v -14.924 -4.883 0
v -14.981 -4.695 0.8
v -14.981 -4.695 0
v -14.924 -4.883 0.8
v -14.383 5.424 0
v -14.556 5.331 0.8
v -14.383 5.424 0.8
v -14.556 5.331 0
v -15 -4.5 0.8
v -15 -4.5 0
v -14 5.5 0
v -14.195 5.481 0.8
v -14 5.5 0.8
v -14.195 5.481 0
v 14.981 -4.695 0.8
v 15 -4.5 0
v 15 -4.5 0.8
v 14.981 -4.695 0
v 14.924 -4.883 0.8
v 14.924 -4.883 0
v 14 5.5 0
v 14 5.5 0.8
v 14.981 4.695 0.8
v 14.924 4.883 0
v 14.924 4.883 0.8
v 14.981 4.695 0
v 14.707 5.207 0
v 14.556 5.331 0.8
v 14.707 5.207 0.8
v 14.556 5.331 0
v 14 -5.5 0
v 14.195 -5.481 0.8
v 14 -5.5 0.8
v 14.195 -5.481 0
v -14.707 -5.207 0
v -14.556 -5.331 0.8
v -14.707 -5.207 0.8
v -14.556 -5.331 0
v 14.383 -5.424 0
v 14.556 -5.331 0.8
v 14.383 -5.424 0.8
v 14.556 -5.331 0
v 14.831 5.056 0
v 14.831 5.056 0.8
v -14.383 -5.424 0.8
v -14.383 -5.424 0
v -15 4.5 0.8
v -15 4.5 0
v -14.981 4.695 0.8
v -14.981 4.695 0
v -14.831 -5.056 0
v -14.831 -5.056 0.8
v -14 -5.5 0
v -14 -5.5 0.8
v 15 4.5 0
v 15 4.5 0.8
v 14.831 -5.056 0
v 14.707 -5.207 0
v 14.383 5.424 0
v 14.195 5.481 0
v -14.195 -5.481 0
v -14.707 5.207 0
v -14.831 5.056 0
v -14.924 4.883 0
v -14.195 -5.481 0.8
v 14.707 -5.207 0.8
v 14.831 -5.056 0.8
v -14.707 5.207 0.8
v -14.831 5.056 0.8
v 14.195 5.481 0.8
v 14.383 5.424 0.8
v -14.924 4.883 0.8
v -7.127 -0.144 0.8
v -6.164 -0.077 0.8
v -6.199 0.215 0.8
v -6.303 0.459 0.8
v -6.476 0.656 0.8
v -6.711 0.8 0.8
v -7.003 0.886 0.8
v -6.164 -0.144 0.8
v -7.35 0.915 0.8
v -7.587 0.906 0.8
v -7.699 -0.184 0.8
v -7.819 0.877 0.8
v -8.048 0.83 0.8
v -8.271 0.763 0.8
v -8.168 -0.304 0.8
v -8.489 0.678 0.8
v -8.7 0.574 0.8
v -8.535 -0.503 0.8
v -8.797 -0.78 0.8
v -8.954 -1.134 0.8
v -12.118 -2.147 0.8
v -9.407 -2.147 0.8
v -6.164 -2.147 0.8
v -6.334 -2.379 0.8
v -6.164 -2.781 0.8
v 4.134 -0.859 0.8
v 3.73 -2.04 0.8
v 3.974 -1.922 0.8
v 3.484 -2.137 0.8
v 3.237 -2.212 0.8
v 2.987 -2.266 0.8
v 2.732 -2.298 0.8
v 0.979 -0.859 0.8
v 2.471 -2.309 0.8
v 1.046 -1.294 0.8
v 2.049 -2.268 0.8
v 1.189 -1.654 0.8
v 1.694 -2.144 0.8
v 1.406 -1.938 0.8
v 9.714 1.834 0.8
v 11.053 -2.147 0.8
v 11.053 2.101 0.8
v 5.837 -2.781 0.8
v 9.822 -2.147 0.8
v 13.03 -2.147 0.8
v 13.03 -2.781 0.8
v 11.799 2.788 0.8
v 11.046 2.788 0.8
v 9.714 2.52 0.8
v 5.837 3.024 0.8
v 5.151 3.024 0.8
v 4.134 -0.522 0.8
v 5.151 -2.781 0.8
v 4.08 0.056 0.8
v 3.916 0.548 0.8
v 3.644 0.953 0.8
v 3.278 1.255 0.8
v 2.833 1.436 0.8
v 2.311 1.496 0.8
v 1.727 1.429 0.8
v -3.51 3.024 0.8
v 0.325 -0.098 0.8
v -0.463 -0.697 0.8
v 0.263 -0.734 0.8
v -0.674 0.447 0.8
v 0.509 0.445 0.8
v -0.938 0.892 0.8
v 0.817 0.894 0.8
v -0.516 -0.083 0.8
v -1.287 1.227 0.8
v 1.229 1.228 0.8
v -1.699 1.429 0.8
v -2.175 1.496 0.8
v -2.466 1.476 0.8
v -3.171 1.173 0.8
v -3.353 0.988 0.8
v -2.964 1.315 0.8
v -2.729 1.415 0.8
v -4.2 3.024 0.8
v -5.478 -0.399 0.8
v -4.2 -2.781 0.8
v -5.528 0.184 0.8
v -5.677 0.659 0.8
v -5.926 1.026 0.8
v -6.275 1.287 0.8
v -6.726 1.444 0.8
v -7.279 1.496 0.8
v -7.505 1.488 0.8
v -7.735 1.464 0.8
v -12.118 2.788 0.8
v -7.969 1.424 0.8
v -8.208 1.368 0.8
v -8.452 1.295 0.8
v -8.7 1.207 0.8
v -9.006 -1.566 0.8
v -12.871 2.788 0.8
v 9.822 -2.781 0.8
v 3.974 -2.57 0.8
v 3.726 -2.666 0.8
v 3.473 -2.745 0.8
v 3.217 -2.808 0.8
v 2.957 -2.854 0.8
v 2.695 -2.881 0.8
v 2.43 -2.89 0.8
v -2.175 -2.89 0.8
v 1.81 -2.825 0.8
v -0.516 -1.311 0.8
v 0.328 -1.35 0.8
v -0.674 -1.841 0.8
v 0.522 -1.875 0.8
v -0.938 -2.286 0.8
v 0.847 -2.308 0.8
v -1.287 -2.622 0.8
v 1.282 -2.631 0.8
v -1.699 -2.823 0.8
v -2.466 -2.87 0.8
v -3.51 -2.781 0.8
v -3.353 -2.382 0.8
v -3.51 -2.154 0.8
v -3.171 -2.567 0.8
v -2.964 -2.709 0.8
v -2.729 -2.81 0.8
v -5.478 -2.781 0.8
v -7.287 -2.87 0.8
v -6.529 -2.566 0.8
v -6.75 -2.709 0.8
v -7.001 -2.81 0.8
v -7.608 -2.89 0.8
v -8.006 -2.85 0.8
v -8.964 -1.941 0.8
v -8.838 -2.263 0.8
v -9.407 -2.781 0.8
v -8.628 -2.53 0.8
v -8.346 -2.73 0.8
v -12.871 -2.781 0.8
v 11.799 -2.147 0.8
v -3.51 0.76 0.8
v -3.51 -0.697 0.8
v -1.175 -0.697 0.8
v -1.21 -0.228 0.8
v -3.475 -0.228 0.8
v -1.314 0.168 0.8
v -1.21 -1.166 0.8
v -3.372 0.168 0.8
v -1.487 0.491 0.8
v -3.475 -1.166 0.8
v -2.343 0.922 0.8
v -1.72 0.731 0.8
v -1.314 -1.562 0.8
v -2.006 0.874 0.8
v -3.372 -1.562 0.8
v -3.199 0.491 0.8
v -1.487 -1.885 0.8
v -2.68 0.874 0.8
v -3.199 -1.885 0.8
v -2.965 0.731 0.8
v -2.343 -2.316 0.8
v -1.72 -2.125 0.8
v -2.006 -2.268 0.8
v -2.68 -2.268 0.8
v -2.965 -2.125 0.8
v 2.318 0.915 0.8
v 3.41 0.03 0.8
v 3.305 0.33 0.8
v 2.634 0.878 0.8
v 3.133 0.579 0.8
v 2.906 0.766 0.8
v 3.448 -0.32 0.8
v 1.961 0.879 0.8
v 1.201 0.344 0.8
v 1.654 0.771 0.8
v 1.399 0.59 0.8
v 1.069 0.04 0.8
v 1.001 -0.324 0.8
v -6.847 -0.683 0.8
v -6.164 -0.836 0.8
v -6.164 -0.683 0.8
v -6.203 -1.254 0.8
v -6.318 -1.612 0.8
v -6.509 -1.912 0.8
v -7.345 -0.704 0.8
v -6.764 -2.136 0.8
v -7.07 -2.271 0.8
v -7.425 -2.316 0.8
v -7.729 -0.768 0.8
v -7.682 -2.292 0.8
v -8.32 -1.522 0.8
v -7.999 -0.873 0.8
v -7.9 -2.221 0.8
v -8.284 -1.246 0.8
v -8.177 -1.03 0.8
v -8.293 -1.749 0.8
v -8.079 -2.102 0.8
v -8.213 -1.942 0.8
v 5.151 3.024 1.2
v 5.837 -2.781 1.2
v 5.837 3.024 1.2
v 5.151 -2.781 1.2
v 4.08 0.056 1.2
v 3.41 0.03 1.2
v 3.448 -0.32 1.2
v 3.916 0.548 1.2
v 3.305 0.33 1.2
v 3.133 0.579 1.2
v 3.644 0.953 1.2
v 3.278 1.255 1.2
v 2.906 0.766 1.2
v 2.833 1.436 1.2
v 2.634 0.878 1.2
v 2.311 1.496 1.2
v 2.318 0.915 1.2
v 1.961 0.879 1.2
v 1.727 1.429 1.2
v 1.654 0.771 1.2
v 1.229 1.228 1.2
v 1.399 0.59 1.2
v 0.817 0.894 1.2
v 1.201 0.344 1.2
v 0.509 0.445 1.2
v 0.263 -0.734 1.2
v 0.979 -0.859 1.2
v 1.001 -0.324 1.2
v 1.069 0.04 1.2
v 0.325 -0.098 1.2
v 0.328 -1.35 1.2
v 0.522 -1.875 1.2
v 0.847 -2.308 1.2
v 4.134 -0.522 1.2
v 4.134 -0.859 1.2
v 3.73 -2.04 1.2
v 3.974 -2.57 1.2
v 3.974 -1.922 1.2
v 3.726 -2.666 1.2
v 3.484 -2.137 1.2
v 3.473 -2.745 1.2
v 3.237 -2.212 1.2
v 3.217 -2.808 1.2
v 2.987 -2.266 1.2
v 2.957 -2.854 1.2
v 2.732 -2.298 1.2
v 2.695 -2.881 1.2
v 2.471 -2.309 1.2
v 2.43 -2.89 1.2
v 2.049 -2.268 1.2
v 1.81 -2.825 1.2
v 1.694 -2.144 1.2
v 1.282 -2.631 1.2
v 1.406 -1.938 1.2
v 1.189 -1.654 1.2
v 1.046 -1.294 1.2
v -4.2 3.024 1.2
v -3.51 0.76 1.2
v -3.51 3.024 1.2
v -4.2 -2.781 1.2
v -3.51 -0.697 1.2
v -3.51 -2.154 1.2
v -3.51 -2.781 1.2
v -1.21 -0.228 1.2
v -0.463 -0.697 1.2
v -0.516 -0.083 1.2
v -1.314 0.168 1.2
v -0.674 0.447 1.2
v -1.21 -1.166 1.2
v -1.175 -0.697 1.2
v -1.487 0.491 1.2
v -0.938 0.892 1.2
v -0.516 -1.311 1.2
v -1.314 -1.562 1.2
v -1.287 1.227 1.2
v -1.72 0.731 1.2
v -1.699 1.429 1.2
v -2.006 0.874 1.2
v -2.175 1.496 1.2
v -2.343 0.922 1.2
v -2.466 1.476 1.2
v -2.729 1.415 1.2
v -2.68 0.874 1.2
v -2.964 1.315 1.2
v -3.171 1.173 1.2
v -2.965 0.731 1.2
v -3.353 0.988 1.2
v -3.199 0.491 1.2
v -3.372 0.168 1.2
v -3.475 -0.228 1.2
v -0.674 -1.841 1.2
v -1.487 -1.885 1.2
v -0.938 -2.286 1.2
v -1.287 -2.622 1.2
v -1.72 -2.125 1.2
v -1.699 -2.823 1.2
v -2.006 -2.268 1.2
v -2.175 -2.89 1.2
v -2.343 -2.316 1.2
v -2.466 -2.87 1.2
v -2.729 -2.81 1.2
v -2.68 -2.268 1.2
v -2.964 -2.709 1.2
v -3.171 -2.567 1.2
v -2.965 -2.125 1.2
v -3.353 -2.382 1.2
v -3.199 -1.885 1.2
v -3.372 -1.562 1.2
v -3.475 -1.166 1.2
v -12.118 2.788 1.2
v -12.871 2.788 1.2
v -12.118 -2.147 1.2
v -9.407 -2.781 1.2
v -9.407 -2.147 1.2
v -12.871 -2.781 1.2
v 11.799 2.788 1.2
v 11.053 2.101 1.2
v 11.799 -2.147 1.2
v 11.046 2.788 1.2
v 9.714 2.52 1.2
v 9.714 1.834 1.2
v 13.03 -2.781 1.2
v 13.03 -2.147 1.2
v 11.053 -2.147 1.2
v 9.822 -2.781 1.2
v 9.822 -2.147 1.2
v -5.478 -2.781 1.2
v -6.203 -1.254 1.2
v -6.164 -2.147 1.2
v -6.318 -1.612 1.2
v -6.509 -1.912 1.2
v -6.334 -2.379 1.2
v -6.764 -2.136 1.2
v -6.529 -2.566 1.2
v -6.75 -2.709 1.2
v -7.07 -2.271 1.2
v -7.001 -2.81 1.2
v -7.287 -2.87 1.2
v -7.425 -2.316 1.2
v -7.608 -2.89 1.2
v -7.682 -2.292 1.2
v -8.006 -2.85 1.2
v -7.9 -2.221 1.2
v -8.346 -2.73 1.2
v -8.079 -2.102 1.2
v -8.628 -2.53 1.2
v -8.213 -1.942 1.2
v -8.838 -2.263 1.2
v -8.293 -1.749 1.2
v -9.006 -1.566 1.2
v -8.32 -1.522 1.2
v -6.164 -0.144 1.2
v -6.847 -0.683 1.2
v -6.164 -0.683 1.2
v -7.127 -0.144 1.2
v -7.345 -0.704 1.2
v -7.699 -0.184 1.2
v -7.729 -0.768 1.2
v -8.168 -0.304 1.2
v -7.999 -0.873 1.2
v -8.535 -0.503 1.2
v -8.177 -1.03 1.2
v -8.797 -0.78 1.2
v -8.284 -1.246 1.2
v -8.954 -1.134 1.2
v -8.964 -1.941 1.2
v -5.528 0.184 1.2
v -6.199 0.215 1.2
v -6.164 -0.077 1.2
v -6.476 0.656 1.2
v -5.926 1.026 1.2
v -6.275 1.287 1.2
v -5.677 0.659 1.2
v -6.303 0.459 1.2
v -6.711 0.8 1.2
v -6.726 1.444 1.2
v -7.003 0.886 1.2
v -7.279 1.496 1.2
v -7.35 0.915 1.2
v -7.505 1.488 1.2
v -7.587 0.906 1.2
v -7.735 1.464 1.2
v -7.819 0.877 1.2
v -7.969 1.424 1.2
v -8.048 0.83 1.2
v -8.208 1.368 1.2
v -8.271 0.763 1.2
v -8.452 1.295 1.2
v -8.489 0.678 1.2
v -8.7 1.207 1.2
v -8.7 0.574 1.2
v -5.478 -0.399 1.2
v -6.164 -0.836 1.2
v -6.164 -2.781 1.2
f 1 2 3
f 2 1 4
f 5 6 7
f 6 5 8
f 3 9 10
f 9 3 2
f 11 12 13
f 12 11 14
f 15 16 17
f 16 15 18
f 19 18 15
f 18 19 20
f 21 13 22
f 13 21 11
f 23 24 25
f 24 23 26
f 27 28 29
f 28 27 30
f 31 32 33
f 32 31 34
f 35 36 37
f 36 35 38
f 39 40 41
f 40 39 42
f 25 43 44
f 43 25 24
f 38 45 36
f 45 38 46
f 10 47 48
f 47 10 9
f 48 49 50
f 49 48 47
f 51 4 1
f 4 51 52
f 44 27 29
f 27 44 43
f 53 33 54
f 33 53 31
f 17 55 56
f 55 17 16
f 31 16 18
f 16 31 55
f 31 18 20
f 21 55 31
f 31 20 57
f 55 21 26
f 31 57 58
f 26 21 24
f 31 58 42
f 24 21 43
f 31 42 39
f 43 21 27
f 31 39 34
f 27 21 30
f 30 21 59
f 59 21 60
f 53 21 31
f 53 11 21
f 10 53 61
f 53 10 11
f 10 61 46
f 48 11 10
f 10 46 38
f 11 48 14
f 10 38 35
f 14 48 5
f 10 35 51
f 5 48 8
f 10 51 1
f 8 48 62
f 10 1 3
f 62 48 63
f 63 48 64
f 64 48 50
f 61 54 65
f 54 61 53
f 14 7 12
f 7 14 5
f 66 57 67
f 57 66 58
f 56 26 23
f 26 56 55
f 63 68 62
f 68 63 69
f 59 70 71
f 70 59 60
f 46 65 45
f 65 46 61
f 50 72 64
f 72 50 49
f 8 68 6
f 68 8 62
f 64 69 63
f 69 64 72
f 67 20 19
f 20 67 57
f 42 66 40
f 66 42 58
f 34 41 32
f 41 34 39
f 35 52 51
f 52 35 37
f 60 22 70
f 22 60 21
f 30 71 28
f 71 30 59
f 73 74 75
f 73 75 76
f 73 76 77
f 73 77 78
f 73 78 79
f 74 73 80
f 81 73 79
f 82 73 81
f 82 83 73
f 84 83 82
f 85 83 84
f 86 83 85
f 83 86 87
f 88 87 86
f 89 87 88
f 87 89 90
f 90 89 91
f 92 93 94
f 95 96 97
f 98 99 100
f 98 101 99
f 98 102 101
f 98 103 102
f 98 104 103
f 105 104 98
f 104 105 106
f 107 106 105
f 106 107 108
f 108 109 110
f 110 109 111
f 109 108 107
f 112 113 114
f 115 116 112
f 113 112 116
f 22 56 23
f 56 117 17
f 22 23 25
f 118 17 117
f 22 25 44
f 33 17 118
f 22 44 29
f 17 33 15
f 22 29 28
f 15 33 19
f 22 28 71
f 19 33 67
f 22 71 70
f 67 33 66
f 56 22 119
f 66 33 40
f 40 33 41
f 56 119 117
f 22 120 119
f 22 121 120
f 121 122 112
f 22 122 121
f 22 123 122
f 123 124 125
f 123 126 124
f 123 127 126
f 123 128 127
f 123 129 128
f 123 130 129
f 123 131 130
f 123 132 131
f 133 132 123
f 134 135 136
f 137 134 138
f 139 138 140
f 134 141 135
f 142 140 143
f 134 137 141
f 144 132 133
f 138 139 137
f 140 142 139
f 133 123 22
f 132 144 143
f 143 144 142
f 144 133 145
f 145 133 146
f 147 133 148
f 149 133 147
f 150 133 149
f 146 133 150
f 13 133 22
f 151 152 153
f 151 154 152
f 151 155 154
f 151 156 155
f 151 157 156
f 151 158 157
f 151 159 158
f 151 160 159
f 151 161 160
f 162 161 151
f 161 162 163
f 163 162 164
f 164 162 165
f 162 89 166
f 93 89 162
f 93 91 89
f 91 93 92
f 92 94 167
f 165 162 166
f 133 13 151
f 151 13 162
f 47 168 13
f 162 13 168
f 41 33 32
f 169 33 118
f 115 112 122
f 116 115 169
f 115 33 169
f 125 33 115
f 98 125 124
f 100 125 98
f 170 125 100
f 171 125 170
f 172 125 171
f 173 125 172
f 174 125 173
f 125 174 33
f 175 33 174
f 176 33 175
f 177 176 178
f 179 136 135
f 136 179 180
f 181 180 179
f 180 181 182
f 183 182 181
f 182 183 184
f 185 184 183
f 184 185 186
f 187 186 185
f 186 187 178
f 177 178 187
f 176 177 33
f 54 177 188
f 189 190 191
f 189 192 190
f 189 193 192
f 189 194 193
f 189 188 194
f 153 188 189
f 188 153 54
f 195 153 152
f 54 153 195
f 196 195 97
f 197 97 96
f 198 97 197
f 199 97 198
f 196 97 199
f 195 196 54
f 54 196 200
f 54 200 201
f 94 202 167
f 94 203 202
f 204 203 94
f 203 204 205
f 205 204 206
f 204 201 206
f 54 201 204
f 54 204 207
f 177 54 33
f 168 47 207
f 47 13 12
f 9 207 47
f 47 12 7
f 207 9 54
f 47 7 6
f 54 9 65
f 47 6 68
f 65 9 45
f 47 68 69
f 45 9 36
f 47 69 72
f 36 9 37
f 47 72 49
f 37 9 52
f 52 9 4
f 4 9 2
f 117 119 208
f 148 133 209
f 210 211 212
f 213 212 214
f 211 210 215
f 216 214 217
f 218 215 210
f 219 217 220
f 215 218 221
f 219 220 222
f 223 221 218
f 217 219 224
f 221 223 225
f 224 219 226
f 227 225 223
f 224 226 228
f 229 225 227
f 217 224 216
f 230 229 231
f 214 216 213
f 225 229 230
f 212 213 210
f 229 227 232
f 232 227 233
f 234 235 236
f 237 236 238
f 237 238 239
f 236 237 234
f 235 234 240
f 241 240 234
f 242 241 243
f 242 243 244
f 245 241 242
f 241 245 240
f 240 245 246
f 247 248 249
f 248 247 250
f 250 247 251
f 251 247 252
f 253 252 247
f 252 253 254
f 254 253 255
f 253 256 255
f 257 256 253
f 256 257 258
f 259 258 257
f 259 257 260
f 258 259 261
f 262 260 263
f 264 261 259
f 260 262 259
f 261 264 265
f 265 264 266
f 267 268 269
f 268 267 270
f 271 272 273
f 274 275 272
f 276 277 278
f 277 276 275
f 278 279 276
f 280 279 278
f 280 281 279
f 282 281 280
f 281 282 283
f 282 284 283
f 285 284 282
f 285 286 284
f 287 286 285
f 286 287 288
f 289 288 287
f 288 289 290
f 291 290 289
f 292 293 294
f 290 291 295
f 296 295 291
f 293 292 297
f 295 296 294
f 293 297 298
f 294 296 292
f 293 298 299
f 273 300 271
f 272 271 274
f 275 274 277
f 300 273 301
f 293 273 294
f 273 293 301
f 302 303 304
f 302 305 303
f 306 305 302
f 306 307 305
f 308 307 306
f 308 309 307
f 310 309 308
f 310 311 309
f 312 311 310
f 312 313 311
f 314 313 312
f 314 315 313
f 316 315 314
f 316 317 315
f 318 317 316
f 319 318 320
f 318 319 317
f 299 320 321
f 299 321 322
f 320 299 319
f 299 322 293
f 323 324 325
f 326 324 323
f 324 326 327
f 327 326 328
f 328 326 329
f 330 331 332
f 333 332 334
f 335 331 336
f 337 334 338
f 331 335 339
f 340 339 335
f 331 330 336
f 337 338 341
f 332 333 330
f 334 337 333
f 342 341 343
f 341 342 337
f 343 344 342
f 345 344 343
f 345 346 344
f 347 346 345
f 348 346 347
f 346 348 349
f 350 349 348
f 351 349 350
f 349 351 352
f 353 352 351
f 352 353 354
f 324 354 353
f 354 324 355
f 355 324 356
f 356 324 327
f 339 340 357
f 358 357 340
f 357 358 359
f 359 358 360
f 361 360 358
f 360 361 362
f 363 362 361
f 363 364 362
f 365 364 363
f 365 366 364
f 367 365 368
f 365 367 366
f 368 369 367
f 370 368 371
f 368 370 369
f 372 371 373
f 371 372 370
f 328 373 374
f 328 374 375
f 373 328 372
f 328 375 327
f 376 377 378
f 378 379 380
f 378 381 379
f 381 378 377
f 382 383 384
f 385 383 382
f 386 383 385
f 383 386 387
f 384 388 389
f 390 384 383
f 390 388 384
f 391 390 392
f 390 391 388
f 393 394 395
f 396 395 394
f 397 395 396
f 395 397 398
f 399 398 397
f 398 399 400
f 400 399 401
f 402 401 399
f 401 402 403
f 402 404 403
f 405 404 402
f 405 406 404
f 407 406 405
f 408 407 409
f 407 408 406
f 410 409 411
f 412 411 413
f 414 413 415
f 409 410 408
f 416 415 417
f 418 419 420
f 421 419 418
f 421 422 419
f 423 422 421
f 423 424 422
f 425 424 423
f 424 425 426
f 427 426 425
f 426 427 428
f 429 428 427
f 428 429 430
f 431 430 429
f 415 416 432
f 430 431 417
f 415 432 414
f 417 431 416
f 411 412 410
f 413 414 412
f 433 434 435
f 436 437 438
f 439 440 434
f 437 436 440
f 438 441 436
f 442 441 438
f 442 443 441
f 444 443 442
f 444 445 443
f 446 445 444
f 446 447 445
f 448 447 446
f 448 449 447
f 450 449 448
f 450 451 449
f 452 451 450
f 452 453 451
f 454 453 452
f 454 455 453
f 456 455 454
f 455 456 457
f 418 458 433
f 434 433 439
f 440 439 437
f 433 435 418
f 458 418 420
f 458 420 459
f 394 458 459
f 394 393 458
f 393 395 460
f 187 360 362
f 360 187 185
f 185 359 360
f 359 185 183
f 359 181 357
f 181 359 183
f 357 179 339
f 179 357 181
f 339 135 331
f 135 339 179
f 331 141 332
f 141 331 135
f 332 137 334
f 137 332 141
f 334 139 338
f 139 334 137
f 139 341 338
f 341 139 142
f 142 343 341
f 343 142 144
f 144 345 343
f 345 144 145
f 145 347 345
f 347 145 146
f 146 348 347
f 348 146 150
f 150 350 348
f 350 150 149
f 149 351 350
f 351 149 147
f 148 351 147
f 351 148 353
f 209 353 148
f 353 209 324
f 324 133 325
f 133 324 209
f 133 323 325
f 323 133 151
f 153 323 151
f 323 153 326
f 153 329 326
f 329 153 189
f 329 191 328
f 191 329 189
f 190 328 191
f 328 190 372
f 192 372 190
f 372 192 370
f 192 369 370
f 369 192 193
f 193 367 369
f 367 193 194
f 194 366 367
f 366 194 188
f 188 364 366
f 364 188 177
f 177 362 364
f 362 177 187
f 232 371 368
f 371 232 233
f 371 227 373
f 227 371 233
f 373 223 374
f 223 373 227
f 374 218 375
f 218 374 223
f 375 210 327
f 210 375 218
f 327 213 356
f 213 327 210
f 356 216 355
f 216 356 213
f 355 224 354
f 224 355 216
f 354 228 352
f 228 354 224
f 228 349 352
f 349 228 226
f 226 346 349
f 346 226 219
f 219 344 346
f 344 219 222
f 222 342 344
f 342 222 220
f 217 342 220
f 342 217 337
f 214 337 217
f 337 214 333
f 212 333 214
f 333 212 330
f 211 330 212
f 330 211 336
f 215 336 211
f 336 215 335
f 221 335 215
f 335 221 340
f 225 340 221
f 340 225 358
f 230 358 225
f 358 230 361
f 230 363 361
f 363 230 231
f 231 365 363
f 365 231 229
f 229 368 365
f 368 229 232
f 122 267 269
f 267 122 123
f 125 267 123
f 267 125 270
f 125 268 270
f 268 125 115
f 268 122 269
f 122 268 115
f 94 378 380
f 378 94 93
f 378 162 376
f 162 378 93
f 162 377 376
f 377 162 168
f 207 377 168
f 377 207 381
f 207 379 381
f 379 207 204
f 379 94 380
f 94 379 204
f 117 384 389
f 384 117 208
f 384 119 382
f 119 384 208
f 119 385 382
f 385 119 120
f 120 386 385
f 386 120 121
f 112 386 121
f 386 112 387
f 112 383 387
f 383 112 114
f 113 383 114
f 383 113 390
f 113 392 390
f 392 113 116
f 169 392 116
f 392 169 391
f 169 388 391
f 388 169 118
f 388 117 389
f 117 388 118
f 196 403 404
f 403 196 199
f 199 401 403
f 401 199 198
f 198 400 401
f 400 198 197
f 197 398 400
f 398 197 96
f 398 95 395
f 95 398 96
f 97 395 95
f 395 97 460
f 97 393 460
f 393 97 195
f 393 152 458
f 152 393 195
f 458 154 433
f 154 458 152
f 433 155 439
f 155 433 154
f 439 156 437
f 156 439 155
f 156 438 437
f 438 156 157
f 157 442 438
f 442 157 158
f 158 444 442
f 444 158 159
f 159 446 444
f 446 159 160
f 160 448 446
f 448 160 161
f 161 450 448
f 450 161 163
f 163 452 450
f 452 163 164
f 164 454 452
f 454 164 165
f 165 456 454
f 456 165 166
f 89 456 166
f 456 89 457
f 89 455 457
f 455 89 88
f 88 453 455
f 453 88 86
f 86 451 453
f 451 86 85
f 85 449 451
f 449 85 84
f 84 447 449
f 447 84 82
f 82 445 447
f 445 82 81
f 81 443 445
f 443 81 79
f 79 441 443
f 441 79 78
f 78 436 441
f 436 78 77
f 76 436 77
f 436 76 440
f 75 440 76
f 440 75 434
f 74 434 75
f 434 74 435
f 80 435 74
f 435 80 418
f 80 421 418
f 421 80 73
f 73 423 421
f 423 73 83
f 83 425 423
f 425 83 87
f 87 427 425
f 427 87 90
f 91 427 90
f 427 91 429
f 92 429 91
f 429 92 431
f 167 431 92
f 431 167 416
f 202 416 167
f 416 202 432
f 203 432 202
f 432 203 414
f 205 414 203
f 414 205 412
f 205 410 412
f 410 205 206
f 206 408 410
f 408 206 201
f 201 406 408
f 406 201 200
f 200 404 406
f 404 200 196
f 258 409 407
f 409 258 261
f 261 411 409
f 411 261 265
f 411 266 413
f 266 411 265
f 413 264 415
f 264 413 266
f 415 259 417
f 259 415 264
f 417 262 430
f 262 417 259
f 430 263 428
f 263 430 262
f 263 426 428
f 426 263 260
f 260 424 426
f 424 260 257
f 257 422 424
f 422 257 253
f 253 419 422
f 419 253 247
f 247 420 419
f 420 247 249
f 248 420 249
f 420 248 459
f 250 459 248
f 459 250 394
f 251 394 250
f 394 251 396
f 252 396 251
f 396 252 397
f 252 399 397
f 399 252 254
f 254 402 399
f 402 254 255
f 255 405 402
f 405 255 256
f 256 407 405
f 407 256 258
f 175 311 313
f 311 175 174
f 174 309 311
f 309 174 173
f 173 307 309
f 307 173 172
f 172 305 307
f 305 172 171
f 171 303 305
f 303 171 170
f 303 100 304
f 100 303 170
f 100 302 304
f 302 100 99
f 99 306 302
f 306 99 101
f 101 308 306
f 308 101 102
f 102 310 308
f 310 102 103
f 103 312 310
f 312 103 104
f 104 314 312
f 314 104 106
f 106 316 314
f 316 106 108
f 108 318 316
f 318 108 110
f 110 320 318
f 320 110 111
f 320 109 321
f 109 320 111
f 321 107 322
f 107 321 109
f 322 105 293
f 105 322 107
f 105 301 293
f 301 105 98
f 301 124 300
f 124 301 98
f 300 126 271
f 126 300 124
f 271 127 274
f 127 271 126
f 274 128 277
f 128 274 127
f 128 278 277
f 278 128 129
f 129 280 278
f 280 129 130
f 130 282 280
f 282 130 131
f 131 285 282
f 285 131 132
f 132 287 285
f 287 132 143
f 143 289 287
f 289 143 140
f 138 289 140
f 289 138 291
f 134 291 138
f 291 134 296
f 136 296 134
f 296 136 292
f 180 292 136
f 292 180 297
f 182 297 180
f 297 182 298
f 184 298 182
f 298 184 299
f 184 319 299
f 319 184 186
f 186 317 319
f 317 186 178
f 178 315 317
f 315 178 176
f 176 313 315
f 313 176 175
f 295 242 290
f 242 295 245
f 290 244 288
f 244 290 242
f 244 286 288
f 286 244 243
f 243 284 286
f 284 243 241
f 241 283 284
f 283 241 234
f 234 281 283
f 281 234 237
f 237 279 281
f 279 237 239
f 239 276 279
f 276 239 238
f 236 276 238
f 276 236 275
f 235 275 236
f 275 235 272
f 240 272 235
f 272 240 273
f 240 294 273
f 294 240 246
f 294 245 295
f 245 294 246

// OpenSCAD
// =======================================================
// Label Creator for SKÅDIS Organizer System
// =======================================================

// ===============================
// Visible user parameters (ordered)
// ===============================

// Label size options
// Options: "S", "M", "L", "XL", "XXL"
Size = "S";

// Text size options
// Options: "S", "M", "L"
Text_Size = "L";

// Number of labels to generate (1–10)
Count = 1;  // increase to add more labels vertically

Label_1 = "Label 1";
Label_2 = "Label 2";
Label_3 = "Label 3";
Label_4 = "Label 4";
Label_5 = "Label 5";
Label_6 = "Label 6";
Label_7 = "Label 7";
Label_8 = "Label 8";
Label_9 = "Label 9";
Label_10 = "Label 10";


// ===============================
// Internal, non-editable values
// ===============================
/* [Hidden] */

Font = "Rubik";           // Fixed font
corner_radius = 1;        // mm corner radius
corner_segments = 32;     // smooth corners
Spacing = 5;              // vertical distance between labels

// --- Helper function: clamp ---
function clamp(v, vmin, vmax) = max(vmin, min(v, vmax));

// --- Map text size option to numeric value ---
function get_text_size(opt) =
    (opt == "S" || opt == "s") ? 4.5 :
    (opt == "M" || opt == "m") ? 5.0 :
    (opt == "L" || opt == "l") ? 5.5 :
                                 5.0; // fallback

Text_Size_Value = get_text_size(Text_Size);

// --- Label dimensions based on preset ---
function get_label_length(s) =
    (s == "S"   || s == "s")   ? 30 :
    (s == "M"   || s == "m")   ? 70 :
    (s == "L"   || s == "l")   ? 110 :
    (s == "XL"  || s == "xl")  ? 150 :
    (s == "XXL" || s == "xxl") ? 190 :
                                 30; // fallback

label_length = get_label_length(Size);
label_width  = 11;
label_height = 0.8;
text_height  = 0.4;

// --- Collect visible labels into a list ---
Texts = [
    Label_1, Label_2, Label_3, Label_4, Label_5,
    Label_6, Label_7, Label_8, Label_9, Label_10
];


// ===============================
// Geometry modules
// ===============================

module Label_Plate() {
    color("White")
        translate([-label_length/2, -label_width/2, 0])
            linear_extrude(height = label_height)
                hull() {
                    translate([corner_radius, corner_radius])
                        circle(r = corner_radius, $fn = corner_segments);
                    translate([label_length - corner_radius, corner_radius])
                        circle(r = corner_radius, $fn = corner_segments);
                    translate([corner_radius, label_width - corner_radius])
                        circle(r = corner_radius, $fn = corner_segments);
                    translate([label_length - corner_radius, label_width - corner_radius])
                        circle(r = corner_radius, $fn = corner_segments);
                }
}

module Label_Text(t) {
    color("Black")
        translate([0, 0, label_height])
            linear_extrude(height = text_height)
                text(t,
                     size = Text_Size_Value,
                     font = Font,
                     halign = "center",
                     valign = "center");
}


// ===============================
// Render output (color-separated for multi-material export)
// ===============================

n = clamp(Count, 1, len(Texts));
total_height = n * label_width + (n - 1) * Spacing;
start_offset = total_height / 2 - label_width / 2;

// Generate both color layers (plates + text) separately at top-level
for (i = [0 : n - 1]) {
    offset = -(i * (label_width + Spacing) - start_offset);
    
    // Base plate (white)
    translate([0, offset, 0])
        Label_Plate();
    
    // Text (black)
    translate([0, offset, 0])
        Label_Text(Texts[i]);
}
